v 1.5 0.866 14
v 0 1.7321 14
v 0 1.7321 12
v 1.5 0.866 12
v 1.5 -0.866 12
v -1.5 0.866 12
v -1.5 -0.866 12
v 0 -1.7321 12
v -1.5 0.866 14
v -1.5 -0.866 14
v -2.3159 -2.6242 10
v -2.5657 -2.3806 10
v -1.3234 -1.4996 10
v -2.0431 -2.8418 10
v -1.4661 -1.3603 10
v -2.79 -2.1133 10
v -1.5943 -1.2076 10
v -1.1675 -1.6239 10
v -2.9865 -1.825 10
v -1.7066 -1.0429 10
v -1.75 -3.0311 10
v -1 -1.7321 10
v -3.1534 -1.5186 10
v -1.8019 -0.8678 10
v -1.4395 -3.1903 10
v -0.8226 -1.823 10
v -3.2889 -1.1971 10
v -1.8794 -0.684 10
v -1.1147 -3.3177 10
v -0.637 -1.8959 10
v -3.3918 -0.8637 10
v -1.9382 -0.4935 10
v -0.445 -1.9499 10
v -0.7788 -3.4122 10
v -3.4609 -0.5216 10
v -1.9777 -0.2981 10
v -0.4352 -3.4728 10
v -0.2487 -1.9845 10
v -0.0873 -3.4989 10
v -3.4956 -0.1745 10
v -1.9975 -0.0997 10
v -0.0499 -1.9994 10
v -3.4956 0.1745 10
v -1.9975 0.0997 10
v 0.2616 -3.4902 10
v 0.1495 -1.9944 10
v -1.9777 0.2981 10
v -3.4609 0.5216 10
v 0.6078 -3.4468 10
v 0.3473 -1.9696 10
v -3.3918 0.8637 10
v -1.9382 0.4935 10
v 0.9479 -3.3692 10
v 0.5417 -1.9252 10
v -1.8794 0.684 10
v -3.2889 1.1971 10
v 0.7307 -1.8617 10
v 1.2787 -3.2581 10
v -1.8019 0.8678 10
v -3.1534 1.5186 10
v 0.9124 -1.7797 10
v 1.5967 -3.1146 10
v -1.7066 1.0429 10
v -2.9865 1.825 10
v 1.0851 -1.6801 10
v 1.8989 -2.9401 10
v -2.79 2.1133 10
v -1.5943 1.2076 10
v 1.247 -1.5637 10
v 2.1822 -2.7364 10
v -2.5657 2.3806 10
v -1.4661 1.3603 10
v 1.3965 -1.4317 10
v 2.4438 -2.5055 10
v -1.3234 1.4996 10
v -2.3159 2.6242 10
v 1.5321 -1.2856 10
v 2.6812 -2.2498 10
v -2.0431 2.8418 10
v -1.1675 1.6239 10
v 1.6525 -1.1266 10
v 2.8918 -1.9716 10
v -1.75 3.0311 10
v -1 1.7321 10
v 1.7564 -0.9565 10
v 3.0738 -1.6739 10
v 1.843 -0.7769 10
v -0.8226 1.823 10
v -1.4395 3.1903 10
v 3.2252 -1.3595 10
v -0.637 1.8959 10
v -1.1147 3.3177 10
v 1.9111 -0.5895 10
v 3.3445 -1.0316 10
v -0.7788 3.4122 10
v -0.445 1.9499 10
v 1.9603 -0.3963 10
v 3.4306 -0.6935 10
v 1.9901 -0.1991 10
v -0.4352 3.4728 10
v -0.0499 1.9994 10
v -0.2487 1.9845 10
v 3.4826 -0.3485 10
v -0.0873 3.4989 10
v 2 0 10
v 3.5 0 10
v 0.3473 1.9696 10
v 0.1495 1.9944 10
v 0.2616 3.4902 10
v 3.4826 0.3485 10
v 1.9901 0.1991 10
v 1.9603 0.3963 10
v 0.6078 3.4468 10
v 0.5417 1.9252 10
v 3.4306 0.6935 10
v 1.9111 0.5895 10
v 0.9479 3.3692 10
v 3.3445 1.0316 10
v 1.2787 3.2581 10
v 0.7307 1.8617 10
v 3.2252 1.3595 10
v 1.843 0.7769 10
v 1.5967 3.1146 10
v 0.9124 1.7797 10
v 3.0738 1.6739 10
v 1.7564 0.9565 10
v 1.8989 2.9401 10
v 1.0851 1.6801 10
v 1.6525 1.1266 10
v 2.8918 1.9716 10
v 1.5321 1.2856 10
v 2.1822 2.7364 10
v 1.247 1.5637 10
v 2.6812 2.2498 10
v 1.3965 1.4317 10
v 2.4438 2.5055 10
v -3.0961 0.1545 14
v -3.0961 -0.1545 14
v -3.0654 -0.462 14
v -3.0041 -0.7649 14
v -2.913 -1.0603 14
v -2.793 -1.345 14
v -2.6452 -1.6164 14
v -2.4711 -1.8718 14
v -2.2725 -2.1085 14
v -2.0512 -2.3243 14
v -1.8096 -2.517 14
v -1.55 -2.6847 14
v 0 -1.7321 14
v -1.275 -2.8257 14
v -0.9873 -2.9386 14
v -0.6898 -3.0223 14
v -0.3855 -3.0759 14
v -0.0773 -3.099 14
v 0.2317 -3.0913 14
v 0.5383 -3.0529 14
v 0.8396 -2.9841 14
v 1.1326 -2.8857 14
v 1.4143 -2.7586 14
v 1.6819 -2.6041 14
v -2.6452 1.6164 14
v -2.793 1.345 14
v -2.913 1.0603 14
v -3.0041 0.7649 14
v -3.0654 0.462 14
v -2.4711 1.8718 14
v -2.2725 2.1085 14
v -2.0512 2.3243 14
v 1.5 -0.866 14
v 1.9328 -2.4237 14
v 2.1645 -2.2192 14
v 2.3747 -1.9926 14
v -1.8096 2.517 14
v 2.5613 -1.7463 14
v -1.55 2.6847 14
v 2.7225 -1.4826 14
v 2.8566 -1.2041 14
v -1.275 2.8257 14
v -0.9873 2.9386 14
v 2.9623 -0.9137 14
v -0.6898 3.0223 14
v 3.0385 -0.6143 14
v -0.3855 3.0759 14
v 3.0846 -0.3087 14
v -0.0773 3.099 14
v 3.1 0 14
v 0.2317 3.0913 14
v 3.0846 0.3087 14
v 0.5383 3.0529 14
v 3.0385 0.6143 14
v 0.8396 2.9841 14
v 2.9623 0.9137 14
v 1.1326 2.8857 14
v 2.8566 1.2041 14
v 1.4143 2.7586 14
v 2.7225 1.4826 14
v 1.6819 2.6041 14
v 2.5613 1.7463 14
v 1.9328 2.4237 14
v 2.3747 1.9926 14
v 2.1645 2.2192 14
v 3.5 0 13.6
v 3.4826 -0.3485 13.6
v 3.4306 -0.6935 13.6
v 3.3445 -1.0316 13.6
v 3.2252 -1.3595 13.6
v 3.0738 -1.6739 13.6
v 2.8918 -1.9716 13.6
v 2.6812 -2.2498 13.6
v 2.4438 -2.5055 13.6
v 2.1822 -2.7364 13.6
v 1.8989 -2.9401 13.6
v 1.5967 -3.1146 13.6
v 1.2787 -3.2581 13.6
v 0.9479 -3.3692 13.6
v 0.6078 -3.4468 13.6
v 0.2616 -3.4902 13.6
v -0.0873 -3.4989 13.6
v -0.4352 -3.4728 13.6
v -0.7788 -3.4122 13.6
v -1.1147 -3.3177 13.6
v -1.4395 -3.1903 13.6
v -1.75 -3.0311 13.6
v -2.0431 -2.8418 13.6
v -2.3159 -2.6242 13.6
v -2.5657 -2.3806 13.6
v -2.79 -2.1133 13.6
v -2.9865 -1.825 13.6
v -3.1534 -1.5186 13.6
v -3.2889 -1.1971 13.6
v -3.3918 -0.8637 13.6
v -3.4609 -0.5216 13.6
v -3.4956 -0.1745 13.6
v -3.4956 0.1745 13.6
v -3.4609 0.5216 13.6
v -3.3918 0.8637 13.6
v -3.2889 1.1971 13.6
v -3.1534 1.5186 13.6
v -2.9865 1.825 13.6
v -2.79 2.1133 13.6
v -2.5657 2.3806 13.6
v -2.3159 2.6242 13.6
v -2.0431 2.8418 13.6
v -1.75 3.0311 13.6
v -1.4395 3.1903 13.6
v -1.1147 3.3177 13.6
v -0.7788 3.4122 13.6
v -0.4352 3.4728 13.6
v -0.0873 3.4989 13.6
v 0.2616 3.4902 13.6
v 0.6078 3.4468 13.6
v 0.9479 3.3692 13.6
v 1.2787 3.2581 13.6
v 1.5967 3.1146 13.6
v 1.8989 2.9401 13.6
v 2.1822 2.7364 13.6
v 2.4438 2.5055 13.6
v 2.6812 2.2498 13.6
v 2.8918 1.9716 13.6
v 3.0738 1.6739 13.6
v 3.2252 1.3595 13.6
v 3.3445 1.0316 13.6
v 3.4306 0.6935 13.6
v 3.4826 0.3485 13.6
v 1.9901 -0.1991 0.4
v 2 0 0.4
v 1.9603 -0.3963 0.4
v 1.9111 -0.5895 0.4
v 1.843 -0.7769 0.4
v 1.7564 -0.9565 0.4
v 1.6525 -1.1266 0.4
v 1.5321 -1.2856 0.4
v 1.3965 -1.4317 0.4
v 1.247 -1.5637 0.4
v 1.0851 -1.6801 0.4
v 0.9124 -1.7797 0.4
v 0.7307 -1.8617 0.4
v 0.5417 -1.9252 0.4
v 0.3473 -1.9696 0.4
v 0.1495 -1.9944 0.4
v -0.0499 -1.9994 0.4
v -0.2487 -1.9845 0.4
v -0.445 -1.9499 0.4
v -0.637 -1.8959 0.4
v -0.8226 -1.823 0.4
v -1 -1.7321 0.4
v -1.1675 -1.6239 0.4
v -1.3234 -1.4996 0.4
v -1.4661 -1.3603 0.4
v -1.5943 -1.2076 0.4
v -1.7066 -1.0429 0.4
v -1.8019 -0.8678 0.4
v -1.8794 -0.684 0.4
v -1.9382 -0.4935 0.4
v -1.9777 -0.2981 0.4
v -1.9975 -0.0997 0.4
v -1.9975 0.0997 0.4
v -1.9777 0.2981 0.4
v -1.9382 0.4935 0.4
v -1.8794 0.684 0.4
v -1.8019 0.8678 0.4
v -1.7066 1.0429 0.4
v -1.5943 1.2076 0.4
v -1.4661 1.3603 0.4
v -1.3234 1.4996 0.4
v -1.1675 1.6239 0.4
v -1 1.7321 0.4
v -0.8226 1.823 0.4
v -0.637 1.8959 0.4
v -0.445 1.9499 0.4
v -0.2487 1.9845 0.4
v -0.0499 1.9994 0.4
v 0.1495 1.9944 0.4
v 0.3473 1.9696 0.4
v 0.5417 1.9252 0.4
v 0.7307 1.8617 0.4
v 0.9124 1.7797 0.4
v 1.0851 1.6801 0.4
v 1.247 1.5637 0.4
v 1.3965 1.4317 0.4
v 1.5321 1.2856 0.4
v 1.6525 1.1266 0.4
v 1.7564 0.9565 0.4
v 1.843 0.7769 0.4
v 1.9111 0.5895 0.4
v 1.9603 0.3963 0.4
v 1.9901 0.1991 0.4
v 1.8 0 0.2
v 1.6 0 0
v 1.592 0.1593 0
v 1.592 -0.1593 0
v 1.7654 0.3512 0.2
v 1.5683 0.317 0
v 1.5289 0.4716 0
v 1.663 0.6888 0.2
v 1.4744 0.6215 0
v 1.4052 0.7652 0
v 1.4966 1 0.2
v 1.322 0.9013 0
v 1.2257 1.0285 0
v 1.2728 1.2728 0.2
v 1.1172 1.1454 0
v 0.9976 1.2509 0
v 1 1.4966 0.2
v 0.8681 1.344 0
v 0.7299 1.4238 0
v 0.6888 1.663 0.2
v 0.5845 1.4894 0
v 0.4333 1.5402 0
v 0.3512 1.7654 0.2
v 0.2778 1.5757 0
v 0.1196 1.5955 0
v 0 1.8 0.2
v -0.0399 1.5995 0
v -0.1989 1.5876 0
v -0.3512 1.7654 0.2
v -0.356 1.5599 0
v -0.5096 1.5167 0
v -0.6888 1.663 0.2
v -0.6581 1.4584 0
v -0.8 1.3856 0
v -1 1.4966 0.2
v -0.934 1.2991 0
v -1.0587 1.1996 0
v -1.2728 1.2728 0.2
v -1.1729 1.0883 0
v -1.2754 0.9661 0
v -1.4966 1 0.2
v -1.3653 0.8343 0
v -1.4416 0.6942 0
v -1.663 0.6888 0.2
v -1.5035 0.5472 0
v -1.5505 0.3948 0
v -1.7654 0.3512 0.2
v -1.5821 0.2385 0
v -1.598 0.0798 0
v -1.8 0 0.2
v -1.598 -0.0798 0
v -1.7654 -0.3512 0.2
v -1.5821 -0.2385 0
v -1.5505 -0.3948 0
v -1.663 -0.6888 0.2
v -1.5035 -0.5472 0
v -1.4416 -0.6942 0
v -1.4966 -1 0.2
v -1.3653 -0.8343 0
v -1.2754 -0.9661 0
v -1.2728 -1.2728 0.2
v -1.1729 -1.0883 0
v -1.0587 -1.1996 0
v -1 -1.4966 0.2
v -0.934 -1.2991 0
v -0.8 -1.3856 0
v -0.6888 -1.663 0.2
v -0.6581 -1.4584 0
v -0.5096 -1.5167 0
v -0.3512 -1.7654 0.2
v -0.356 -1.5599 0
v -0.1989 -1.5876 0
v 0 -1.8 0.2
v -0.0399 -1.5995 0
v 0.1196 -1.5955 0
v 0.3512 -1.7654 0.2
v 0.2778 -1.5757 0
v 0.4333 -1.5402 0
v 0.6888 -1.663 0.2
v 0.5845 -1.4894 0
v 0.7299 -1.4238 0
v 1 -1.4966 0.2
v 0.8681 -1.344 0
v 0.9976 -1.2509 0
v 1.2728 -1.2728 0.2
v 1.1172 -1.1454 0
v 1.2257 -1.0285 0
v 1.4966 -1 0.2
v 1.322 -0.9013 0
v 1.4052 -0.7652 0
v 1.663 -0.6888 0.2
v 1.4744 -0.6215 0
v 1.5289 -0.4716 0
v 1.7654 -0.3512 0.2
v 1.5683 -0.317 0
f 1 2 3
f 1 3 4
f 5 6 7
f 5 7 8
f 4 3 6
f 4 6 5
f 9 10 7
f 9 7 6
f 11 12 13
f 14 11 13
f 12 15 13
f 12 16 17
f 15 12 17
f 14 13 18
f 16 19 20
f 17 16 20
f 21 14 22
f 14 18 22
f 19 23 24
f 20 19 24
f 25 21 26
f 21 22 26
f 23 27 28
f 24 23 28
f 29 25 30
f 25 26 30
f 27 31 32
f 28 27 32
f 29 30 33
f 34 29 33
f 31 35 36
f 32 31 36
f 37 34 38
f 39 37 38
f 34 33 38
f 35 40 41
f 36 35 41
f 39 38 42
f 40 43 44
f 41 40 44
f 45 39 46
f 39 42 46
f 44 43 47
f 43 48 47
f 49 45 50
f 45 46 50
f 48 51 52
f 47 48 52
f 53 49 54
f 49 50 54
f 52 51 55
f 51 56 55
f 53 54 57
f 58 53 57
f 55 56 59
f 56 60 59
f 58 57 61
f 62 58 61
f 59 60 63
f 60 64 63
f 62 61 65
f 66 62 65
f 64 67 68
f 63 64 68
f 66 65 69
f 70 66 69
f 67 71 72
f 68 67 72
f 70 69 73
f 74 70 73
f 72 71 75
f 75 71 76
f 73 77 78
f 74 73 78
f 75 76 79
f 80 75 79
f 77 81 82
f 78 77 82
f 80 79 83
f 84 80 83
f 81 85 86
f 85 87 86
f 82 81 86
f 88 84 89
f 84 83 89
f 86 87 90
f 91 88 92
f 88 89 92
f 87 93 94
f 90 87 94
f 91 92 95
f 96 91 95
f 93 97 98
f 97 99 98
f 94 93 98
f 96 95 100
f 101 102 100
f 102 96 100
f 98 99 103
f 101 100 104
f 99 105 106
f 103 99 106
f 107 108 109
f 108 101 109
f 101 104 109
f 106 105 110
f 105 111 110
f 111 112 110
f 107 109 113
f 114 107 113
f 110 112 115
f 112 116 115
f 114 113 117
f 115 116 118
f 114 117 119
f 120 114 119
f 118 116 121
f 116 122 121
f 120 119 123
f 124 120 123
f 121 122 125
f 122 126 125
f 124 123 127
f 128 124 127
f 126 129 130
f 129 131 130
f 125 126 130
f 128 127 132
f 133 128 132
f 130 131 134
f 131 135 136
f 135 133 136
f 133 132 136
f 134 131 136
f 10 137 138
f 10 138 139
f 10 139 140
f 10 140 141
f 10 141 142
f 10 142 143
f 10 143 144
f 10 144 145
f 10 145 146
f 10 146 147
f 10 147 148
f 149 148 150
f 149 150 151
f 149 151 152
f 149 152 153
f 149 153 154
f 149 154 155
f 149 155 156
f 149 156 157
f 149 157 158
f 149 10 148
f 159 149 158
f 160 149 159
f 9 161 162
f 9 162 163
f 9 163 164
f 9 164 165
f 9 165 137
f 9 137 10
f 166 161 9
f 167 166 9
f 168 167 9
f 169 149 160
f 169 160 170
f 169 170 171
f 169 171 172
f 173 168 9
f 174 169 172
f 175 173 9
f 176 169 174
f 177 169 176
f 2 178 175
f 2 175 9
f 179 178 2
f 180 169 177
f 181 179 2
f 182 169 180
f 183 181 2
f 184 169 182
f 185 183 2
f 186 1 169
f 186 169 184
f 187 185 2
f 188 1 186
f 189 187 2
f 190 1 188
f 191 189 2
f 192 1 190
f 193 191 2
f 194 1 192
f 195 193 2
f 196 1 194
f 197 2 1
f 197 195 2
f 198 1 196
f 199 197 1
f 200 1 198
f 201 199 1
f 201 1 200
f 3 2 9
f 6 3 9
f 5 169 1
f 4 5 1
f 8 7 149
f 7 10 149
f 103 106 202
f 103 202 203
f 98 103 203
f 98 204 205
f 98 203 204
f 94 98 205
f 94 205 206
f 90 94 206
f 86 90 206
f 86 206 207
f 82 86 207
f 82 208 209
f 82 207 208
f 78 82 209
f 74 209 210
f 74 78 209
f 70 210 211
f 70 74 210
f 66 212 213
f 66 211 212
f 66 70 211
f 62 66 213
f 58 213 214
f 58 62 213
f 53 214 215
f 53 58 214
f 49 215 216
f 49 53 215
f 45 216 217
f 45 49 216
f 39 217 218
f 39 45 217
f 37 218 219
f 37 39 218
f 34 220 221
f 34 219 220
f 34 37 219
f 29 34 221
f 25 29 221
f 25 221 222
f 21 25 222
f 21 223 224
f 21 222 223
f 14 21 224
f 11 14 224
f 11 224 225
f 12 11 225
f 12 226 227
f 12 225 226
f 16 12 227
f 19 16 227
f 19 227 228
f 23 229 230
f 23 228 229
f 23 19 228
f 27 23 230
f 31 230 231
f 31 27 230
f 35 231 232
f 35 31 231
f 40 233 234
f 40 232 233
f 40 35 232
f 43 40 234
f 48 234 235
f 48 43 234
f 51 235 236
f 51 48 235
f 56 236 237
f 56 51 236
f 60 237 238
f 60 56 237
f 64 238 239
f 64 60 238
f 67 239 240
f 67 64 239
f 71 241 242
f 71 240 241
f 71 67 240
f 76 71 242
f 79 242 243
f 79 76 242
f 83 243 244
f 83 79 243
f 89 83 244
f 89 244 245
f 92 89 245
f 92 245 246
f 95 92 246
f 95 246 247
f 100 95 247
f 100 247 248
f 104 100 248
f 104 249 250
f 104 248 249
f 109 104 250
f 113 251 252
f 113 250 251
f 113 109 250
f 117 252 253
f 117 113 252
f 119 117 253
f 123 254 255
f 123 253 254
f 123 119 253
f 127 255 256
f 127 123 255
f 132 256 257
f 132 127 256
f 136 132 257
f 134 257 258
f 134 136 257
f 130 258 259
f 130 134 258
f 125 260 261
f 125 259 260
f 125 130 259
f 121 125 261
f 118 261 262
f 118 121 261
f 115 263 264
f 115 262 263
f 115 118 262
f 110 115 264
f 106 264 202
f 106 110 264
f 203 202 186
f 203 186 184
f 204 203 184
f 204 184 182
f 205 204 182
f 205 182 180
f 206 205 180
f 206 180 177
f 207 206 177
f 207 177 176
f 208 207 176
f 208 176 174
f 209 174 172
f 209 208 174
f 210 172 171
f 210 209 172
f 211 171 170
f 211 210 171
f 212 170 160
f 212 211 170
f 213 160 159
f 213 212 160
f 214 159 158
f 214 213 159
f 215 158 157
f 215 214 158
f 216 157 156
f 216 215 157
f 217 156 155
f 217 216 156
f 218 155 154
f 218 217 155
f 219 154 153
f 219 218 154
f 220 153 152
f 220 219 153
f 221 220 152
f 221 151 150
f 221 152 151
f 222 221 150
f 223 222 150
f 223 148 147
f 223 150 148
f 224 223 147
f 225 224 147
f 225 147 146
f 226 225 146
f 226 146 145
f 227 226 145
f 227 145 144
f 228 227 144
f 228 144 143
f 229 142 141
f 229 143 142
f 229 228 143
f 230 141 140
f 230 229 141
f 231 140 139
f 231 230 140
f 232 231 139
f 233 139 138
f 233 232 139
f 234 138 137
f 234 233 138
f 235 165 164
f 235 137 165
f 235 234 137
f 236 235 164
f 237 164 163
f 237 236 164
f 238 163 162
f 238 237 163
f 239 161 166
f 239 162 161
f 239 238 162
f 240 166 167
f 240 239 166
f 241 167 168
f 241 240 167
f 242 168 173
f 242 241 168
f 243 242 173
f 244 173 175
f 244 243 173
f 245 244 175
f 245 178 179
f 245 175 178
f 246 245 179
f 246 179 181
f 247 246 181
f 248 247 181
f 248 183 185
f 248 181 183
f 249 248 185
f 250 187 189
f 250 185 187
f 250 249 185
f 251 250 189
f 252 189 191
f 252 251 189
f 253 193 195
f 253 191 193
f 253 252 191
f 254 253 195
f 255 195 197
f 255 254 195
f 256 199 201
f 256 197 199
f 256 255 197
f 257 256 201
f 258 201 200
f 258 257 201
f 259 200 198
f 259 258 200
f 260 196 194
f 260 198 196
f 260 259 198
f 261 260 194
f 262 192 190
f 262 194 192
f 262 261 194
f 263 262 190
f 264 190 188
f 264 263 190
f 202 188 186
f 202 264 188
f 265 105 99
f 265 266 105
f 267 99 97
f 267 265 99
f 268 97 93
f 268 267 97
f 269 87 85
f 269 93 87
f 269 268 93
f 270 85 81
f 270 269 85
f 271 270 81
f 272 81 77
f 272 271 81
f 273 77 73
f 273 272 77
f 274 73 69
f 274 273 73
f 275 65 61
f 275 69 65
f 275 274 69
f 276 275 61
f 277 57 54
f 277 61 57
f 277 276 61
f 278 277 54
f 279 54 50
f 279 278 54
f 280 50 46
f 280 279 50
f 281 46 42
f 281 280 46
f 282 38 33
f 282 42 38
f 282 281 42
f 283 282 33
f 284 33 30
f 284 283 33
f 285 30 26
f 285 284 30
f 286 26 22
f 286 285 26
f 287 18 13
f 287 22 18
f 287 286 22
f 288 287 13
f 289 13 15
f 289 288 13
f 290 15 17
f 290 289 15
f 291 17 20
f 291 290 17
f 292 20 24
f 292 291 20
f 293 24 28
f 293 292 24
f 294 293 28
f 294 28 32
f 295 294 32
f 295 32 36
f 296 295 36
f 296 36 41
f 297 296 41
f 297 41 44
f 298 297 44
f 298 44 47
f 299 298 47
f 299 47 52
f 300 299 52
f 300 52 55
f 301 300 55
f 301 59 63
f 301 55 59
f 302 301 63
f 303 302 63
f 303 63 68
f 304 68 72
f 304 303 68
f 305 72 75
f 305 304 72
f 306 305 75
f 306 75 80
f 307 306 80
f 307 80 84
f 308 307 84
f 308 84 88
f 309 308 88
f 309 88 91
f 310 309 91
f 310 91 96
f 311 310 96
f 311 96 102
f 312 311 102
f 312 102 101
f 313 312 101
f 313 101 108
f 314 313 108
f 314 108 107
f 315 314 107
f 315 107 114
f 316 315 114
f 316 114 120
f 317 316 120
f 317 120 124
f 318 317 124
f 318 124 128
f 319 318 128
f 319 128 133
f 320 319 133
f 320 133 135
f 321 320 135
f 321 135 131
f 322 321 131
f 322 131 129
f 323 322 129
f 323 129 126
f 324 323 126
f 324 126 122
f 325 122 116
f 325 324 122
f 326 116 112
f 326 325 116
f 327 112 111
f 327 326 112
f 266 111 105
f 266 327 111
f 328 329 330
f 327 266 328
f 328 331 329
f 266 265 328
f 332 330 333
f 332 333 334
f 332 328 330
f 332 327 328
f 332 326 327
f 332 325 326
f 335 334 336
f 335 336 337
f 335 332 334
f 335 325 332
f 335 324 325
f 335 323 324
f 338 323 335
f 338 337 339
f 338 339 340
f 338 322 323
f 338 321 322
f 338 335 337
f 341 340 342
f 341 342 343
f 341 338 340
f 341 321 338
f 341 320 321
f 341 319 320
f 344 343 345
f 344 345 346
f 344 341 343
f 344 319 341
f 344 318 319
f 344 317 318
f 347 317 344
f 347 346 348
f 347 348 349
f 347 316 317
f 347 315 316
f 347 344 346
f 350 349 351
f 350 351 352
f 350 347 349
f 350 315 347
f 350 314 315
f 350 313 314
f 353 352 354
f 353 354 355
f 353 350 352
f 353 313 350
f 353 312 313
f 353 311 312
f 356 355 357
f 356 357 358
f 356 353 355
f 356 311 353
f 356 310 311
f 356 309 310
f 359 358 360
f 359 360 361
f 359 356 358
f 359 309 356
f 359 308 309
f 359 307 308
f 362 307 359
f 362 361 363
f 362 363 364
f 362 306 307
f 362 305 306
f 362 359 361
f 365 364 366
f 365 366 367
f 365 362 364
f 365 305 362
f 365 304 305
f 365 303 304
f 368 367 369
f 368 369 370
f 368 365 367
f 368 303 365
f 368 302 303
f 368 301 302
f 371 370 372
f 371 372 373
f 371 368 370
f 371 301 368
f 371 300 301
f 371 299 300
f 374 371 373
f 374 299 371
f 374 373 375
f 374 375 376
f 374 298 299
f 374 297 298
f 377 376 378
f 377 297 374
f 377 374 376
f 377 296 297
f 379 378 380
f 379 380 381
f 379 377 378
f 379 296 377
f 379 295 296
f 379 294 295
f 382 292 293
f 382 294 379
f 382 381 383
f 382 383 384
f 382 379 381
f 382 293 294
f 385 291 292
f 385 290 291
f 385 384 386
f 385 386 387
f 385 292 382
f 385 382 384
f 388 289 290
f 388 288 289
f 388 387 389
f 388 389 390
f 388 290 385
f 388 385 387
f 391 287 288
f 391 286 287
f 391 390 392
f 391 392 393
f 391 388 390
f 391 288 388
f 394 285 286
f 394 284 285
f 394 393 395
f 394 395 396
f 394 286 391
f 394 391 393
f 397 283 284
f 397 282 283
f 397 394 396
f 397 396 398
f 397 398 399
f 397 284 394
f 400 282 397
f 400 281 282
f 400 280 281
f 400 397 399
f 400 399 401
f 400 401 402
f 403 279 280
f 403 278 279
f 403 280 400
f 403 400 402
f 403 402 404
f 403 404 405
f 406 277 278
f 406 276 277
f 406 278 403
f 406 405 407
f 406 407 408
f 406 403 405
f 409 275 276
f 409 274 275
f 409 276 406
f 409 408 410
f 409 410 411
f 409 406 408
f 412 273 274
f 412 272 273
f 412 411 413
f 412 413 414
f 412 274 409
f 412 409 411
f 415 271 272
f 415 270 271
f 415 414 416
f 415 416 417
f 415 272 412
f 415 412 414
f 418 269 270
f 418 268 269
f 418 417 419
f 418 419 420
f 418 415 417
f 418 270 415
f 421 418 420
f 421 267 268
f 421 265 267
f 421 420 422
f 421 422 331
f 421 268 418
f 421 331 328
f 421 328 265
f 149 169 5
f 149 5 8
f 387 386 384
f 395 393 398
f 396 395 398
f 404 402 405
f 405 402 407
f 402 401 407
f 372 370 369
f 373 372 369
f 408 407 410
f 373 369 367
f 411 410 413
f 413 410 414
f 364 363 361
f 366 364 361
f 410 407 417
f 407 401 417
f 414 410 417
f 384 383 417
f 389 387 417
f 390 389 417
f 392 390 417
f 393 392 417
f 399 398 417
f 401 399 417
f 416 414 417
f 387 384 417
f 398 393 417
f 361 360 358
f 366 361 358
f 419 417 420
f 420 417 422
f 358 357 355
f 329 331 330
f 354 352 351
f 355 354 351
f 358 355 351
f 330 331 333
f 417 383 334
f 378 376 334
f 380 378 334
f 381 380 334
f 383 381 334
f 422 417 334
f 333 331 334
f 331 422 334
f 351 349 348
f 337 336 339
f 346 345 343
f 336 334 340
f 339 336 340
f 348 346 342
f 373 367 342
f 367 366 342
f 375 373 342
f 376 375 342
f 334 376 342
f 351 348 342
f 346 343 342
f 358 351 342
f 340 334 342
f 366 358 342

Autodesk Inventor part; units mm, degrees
ref_plane "YZ Plane" through (0, 0, 0) normal (1, 0, 0) x (0, 1, 0)
ref_plane "XZ Plane" through (0, 0, 0) normal (0, 1, 0) x (-1, 0, 0)
ref_plane "XY Plane" through (0, 0, 0) normal (0, 0, 1) x (1, 0, 0)
sketch "Sketch1" plane through (0, 0, 0) normal (0, 0, 1) x (1, 0, 0)
  circle A0 centre (0, 0) radius 2
  dimension "Diameter" = 4
extrude "Extrusion1" add sketch "Sketch1" along normal blind 10
sketch "Sketch2" plane through (0, 0, 10) normal (0, 0, 1) x (1, 0, 0)
  circle A0 centre (0, 0) radius 2 projected
  circle A1 centre (0, 0) radius 3.5
  dimension "Head_Diameter" = 7
extrude "Extrusion2" add sketch "Sketch2" along normal blind 4 contours A0 | A1
sketch "Sketch3" plane through (0, 0, 14) normal (0, 0, 1) x (1, 0, 0)
  circle A0 centre (0, 0) radius 3.5 projected
  circle A1 centre (0, 0) radius 1.7321 construction
  line L0 (0, 1.7321) -> (1.5, 0.866)
  line L1 (1.5, -0.866) -> (1.5, 0.866)
  line L2 (0, 1.7321) -> (-1.5, 0.866)
  line L3 (-1.5, -0.866) -> (-1.5, 0.866)
  line L4 (-1.5, -0.866) -> (0, -1.7321)
  line L5 (1.5, -0.866) -> (0, -1.7321)
  dimension "Hex_Width" = 3
extrude "Extrusion3" cut sketch "Sketch3" against normal blind 2 contours L0 L1 L5 L4 L3 L2
thread "Thread1" size "M4x0.7" class "4g6g" standard "ANSI Metric M Profile" length 20
chamfer "Chamfer1" distance 0.4 angle 45 2 edges at (-3.5, 0, 14) (-2, 0, 0)
equation "\"d9\" = ThreadLength"
equation "\"d12\" = Chamfer"
equation "\"ThreadLength\" = 20"
equation "\"Chamfer\" = 0.4"
properties part number "SCREW, SOCKET HD, P, 12_9, M4X0_7X10" material "Steel, MS"
